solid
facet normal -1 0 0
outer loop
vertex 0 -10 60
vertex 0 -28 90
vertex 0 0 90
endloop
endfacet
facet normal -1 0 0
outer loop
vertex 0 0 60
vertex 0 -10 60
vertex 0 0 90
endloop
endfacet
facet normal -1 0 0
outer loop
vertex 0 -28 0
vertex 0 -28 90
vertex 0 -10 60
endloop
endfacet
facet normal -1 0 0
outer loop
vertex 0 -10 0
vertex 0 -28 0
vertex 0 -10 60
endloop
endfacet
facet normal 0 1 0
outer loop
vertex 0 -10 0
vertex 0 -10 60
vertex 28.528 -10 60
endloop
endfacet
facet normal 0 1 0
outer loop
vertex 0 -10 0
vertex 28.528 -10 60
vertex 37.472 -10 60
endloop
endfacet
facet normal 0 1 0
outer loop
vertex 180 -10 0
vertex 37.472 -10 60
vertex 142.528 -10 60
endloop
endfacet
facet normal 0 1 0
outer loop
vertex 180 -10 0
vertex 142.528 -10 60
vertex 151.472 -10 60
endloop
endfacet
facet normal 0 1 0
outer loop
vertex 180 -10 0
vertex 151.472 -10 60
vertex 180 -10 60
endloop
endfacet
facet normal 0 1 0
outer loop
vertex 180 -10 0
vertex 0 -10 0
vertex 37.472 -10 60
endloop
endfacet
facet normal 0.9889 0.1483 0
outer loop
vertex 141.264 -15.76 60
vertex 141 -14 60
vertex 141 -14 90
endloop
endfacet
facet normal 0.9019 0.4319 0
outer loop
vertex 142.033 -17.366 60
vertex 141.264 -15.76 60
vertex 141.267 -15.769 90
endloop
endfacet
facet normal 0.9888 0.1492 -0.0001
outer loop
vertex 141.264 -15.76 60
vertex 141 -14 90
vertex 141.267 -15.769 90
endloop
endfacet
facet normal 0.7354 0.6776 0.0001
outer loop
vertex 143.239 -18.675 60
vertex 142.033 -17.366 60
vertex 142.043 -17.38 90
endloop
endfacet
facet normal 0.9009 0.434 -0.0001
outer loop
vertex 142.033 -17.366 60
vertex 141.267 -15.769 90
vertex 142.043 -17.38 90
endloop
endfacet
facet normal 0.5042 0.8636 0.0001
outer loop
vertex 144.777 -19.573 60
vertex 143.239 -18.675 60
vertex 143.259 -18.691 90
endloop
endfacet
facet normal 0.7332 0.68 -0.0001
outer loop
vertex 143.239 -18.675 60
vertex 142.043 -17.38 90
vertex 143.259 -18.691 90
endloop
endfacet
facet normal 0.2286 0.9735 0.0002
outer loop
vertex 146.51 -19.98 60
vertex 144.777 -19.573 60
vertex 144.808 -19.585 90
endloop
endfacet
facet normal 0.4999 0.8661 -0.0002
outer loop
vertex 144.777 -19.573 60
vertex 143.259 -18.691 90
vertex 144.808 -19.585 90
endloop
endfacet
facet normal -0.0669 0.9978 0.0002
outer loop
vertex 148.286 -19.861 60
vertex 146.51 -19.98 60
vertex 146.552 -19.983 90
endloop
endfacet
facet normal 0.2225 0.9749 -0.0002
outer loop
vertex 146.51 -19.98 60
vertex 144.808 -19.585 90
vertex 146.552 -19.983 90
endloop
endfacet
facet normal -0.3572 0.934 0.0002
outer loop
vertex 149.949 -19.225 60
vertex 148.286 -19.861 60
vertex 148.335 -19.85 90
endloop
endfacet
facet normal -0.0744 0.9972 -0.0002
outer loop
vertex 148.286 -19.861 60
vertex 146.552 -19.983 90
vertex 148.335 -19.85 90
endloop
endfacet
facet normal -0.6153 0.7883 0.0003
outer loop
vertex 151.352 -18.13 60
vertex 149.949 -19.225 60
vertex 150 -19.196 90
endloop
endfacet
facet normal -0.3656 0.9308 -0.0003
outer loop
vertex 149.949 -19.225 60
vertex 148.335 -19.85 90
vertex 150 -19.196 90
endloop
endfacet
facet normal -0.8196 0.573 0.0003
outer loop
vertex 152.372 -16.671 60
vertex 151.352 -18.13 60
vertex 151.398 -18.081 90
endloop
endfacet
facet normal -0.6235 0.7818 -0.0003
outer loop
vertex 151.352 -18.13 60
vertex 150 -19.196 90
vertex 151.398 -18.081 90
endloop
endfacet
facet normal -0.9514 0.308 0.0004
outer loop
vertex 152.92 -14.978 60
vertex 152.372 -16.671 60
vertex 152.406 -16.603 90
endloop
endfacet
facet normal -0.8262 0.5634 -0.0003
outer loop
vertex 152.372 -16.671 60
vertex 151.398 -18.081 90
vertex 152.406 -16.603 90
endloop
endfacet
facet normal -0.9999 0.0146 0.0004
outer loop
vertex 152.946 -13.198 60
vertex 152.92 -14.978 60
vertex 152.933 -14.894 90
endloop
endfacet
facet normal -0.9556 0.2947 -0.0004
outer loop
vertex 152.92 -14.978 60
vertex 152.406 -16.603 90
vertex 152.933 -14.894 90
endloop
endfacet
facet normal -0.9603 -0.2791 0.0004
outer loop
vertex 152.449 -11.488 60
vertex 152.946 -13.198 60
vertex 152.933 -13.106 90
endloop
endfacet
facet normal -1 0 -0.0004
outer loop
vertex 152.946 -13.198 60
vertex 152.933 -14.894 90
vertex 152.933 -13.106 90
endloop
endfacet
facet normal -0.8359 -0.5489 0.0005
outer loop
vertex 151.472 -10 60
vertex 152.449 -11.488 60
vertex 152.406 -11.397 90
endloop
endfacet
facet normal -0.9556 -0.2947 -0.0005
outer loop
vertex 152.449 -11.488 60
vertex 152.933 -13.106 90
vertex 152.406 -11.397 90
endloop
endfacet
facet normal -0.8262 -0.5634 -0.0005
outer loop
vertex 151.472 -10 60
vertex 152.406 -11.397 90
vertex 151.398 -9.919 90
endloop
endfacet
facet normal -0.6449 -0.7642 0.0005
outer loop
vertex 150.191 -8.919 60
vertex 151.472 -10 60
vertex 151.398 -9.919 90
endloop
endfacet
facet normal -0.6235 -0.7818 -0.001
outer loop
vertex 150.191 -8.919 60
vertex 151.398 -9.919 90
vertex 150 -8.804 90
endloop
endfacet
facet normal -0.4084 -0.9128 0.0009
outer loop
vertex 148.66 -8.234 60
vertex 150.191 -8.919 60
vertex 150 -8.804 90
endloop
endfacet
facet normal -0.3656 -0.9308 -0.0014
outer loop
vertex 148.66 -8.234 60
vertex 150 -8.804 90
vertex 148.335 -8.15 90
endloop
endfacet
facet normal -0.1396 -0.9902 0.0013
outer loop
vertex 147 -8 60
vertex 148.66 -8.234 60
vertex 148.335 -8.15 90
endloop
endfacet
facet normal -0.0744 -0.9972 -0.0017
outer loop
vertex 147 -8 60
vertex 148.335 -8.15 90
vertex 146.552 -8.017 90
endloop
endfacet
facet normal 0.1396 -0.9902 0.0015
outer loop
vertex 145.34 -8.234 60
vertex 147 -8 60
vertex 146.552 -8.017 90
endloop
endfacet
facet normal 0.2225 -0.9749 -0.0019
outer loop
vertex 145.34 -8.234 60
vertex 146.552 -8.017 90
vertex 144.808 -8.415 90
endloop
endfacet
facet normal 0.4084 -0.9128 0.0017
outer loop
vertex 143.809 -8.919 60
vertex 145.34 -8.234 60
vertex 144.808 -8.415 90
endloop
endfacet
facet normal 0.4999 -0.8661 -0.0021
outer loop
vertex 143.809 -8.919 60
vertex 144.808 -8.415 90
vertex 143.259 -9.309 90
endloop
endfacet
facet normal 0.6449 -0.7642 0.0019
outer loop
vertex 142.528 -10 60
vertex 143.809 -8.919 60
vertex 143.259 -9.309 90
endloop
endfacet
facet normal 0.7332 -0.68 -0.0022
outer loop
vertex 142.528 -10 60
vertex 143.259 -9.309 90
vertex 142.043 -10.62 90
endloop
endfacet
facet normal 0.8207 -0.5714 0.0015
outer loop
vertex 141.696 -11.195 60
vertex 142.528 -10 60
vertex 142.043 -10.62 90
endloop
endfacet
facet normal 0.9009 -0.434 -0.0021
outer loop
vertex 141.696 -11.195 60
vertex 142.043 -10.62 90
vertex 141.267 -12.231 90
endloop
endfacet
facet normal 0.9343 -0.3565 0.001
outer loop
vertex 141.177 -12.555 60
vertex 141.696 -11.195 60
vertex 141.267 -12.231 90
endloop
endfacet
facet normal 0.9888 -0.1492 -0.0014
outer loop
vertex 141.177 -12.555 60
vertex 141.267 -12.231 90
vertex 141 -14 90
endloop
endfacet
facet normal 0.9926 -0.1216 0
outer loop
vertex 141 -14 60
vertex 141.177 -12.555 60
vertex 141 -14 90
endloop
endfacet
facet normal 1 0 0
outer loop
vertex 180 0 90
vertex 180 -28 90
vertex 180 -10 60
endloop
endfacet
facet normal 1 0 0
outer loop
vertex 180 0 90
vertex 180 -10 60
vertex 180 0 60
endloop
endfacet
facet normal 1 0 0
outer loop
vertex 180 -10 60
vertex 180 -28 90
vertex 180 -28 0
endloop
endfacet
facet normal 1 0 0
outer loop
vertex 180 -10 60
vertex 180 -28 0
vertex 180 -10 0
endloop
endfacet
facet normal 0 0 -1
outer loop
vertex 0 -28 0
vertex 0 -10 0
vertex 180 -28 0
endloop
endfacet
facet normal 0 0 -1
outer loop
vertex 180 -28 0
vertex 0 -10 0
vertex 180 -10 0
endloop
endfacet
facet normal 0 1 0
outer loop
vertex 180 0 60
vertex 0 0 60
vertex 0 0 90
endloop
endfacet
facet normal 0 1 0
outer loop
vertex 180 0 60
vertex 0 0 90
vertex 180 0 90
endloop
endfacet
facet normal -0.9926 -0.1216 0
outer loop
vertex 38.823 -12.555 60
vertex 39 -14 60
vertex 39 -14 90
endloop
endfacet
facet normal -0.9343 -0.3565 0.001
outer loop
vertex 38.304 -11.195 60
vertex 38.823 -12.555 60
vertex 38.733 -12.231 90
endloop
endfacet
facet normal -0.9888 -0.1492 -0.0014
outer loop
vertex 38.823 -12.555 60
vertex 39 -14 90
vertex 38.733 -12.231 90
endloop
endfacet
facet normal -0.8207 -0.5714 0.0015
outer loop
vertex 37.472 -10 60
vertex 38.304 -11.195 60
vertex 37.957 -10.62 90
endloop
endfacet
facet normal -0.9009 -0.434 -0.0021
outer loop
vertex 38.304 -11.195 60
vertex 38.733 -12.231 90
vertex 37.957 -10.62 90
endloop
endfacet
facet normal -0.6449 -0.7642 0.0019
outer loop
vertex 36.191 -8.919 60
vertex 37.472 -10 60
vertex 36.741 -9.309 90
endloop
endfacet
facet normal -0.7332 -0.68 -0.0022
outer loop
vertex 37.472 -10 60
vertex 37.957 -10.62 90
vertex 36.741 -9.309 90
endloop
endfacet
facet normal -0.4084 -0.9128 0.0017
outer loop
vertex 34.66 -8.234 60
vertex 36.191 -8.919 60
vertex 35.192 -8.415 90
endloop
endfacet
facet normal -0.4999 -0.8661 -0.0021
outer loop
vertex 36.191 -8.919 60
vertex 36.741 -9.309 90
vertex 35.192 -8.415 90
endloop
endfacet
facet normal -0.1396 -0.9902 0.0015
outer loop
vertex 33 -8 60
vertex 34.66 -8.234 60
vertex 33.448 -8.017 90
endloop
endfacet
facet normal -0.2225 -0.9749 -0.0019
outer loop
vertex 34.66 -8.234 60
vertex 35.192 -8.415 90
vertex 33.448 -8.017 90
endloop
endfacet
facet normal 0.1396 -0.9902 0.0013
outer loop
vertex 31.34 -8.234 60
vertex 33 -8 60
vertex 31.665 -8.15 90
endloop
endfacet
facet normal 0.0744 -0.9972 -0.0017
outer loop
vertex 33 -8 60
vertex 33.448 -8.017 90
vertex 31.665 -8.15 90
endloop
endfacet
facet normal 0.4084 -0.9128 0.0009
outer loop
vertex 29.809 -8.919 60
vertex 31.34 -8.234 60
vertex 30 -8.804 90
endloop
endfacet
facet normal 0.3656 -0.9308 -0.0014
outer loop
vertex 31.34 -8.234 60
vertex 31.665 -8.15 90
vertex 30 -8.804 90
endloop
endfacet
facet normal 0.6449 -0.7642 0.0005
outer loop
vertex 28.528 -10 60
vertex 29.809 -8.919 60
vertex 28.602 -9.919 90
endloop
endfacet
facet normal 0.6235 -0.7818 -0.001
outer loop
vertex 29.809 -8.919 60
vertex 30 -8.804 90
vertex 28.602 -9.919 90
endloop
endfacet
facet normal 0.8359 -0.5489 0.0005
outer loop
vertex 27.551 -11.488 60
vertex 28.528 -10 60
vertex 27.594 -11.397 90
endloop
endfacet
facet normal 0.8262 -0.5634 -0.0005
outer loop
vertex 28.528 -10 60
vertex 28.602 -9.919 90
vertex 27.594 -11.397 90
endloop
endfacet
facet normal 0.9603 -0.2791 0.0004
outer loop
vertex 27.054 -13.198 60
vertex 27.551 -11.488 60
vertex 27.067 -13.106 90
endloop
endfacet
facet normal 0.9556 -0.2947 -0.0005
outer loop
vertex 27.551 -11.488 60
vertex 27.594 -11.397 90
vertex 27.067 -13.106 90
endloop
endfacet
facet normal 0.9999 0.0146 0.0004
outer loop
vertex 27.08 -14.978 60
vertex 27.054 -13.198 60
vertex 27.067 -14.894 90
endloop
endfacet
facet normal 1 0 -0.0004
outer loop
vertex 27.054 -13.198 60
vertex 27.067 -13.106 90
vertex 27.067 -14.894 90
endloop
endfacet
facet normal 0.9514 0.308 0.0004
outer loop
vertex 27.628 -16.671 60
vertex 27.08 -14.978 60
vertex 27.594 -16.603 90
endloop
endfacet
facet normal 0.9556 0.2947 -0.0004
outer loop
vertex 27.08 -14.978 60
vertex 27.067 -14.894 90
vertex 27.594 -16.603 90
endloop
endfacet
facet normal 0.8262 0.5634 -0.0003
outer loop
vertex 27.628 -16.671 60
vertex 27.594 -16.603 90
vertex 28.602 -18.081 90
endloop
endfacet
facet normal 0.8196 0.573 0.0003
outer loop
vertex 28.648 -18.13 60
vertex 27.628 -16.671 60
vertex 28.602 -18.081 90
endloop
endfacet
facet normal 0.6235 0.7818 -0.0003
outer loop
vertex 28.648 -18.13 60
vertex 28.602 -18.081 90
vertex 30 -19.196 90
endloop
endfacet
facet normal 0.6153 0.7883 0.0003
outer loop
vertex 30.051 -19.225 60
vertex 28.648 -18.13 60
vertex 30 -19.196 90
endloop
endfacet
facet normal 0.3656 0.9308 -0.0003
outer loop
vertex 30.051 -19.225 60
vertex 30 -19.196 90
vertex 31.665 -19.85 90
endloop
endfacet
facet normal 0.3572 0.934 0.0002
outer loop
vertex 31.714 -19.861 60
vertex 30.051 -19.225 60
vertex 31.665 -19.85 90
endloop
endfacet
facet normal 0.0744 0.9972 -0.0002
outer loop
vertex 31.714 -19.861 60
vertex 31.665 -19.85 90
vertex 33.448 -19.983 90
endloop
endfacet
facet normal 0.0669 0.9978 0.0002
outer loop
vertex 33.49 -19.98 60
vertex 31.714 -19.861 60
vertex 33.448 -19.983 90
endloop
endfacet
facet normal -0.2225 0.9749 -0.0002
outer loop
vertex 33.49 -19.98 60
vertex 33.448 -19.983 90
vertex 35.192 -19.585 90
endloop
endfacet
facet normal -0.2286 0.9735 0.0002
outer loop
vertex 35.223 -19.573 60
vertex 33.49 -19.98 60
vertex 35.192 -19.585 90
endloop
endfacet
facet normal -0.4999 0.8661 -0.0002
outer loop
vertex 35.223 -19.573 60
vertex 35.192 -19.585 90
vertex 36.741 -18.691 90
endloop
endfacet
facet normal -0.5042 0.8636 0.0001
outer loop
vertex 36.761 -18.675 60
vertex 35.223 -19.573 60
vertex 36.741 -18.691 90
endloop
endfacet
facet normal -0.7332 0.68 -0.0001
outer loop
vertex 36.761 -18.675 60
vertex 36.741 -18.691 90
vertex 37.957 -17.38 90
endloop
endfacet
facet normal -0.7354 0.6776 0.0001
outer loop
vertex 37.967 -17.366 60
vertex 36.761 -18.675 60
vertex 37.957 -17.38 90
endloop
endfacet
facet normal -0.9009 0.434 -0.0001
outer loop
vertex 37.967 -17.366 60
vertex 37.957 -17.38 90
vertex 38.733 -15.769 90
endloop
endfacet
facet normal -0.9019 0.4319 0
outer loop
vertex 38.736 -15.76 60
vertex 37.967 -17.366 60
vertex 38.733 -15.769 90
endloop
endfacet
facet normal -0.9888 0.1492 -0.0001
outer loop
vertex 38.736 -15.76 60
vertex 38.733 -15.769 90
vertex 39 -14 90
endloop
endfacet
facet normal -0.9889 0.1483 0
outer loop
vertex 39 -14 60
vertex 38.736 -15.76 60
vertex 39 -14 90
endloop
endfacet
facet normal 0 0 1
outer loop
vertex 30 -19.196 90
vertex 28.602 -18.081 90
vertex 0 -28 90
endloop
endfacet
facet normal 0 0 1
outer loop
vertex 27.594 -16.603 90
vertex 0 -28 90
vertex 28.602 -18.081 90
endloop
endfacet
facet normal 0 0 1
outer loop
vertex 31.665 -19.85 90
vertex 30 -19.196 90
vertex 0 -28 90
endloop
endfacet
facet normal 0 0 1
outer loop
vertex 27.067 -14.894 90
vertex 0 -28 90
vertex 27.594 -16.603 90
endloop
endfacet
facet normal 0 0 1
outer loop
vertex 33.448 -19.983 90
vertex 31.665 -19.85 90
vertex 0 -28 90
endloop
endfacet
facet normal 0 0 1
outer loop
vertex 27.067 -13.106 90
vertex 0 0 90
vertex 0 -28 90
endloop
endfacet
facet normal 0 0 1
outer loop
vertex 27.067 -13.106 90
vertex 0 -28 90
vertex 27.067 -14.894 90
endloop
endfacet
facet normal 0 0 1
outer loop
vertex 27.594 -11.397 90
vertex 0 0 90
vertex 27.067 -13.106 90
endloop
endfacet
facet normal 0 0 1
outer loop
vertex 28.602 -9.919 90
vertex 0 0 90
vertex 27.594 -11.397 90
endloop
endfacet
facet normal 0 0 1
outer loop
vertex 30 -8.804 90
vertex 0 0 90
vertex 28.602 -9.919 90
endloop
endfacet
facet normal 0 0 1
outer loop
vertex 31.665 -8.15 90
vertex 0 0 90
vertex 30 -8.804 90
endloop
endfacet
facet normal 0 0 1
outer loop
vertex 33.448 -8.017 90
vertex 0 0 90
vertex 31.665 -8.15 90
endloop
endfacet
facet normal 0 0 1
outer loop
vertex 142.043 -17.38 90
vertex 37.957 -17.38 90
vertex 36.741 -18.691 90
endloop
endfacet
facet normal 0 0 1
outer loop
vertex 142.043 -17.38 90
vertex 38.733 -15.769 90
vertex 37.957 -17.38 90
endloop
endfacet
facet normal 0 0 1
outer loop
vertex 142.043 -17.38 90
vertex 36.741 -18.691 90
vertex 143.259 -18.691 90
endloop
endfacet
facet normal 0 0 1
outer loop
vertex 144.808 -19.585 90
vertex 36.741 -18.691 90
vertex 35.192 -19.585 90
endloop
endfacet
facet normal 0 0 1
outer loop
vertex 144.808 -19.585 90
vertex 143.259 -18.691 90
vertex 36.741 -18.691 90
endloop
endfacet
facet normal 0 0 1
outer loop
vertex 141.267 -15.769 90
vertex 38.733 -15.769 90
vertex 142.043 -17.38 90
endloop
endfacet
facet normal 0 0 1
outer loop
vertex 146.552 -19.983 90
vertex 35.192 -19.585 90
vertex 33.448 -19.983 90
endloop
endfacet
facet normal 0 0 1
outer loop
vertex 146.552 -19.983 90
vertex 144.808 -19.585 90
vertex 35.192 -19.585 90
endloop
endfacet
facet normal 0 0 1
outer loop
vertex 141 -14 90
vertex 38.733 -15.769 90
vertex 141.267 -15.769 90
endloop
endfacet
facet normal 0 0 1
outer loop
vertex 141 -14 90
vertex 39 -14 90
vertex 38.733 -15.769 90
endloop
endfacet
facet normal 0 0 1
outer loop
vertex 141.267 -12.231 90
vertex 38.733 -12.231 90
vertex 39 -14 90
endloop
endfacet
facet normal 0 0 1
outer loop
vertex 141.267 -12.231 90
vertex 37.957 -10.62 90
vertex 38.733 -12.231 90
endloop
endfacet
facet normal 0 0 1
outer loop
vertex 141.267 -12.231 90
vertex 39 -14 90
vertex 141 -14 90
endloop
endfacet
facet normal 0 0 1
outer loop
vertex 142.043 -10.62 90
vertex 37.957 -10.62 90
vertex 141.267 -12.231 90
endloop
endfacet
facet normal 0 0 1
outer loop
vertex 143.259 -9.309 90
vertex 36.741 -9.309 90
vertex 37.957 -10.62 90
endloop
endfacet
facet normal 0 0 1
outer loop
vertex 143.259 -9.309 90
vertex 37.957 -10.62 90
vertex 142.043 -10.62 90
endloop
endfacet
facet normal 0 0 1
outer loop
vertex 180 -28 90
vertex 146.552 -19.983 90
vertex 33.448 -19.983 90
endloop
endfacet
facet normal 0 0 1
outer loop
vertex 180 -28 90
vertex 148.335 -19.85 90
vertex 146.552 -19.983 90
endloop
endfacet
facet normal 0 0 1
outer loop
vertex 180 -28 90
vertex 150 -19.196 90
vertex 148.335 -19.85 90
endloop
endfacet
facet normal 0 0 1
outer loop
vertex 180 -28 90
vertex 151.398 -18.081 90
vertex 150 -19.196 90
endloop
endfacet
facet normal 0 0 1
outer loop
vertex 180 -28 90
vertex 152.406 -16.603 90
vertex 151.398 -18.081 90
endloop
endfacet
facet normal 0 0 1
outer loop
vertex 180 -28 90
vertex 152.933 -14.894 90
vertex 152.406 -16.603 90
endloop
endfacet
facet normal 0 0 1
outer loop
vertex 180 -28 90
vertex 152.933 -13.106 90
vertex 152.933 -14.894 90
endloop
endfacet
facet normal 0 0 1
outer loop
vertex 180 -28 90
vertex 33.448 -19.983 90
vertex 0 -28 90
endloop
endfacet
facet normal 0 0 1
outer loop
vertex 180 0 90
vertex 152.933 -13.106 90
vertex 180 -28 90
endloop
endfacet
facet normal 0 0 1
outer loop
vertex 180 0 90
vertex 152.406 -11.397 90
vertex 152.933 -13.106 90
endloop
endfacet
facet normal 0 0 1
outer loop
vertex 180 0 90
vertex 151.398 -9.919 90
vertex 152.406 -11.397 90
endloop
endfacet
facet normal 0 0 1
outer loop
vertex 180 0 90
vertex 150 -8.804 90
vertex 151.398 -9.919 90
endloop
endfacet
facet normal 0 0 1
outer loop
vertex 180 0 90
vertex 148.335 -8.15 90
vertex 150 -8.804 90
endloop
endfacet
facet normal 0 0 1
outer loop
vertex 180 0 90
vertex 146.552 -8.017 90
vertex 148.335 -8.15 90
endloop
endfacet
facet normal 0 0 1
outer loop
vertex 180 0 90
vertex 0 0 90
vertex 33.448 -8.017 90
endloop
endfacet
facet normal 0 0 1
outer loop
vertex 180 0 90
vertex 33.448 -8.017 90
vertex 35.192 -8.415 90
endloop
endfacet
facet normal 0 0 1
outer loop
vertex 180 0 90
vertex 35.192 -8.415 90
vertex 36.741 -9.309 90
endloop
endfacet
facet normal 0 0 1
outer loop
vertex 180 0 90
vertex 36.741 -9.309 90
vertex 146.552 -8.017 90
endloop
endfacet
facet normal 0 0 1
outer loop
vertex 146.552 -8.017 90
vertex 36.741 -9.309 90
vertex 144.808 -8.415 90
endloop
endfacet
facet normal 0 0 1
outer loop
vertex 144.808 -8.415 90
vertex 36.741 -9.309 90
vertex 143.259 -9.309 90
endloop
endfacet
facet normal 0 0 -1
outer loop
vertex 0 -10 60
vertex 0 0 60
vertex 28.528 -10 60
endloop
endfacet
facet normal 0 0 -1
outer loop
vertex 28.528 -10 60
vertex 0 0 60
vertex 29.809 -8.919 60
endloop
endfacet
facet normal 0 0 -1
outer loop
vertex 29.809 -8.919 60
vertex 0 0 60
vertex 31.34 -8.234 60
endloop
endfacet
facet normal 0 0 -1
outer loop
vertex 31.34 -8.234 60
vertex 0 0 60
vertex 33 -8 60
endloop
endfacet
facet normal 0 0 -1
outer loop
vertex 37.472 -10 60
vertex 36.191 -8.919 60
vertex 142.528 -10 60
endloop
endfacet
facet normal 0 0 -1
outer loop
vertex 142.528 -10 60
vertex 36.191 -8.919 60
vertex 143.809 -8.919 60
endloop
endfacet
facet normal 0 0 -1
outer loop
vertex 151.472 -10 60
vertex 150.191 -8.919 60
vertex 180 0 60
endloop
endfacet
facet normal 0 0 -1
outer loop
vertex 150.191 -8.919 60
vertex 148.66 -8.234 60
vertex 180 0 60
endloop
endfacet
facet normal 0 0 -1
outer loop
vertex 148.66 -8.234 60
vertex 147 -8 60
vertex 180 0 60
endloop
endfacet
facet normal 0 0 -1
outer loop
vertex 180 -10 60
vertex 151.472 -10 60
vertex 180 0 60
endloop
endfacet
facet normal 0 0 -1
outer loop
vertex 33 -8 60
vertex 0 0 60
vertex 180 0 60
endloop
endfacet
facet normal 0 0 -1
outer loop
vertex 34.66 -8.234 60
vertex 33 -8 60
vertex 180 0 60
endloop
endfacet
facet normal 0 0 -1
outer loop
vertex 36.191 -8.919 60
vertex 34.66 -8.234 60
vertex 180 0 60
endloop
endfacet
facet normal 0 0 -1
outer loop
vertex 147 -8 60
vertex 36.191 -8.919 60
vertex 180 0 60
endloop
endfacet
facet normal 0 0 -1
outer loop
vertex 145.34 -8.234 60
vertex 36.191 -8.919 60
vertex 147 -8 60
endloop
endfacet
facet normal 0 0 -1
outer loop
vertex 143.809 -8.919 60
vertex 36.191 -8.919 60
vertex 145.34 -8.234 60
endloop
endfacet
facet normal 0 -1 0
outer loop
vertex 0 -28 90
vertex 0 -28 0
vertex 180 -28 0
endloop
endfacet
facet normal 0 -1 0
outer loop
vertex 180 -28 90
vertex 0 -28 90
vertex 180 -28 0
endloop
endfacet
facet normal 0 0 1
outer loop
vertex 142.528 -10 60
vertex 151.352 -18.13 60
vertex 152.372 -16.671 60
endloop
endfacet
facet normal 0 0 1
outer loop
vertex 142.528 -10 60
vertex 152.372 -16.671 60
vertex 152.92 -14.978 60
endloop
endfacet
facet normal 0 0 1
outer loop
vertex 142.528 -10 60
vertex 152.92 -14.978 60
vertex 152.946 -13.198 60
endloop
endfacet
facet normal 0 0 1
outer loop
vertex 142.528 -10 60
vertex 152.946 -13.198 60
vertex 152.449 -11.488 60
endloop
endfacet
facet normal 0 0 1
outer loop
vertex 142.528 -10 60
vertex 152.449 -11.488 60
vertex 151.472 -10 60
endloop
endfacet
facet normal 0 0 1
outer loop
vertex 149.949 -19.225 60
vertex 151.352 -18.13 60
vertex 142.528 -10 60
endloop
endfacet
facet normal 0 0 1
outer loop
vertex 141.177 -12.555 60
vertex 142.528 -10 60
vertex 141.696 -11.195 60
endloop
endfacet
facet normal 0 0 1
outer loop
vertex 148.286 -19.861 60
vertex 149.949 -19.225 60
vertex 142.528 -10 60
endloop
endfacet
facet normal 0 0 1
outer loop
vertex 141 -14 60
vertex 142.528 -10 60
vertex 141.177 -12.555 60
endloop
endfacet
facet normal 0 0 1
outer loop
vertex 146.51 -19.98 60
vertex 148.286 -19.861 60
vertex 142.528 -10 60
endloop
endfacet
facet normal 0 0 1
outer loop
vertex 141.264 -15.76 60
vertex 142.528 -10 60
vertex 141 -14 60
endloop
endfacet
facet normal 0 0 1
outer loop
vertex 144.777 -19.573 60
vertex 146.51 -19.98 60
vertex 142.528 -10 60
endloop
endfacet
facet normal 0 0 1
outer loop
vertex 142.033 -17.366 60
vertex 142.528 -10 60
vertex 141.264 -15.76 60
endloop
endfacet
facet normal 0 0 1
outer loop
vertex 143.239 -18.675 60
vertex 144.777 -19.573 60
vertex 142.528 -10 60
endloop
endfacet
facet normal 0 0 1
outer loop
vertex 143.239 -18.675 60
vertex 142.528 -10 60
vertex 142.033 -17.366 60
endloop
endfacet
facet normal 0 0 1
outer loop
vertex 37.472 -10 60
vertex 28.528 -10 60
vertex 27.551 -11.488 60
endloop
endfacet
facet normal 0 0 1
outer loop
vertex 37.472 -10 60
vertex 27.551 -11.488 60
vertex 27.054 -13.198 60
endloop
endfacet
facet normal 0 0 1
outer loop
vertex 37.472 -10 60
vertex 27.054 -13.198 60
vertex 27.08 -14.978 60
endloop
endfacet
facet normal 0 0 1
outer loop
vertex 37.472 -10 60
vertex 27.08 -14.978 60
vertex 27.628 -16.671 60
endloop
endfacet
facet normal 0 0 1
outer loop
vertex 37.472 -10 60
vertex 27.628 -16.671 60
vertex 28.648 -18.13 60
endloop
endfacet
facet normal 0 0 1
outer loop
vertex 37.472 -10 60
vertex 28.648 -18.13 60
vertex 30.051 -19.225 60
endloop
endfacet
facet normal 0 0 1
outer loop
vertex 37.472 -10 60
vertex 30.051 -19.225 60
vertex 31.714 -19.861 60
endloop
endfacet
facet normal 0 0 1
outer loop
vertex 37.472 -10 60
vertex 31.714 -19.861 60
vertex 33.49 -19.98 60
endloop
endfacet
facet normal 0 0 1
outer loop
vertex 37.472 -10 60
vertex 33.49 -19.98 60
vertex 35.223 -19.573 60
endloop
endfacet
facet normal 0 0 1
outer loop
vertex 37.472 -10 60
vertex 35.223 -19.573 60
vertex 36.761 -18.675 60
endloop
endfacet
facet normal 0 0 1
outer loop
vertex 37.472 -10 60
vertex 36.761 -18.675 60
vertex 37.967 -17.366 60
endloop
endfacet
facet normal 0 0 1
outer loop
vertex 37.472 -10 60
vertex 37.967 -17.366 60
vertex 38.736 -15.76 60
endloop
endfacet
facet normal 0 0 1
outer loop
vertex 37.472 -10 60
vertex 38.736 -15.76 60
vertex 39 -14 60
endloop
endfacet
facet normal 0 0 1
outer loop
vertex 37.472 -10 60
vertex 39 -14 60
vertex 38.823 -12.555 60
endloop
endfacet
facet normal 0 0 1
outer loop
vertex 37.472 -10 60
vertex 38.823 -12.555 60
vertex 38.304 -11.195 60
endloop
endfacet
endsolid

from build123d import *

# Parameters (mm, degrees)
SKETCH_1_W          = 180
SKETCH_1_H          = 28
EXTRUDE_1_DEPTH     = 90
SKETCH_2_R          = 6
CUT_EXTRUDE_1_DEPTH = 30
SKETCH_3_W          = 180
SKETCH_3_H          = 60
CUT_EXTRUDE_2_DEPTH = 10


with BuildPart() as part:
    # 草图1 → 拉伸1 (new body)
    with BuildSketch(Plane.XY):
        with Locations((90, -14)):
            Rectangle(SKETCH_1_W, SKETCH_1_H)
    extrude(amount=EXTRUDE_1_DEPTH)

    # 草图2 → 切除-拉伸1 (cut)
    with BuildSketch(Plane.XY.offset(90)):
        with Locations((33, -14)):
            Circle(SKETCH_2_R)
        with Locations(Location((147, -14, 0), (0, 0, 180))):
            Circle(SKETCH_2_R)
    extrude(amount=-CUT_EXTRUDE_1_DEPTH, mode=Mode.SUBTRACT)

    # 草图3 → 切除-拉伸2 (cut)
    with BuildSketch(Plane(origin=(0, 0, 0), x_dir=(1, 0, 0), z_dir=(0, 1, 0))):
        with Locations((90, -30)):
            Rectangle(SKETCH_3_W, SKETCH_3_H)
    extrude(amount=-CUT_EXTRUDE_2_DEPTH, mode=Mode.SUBTRACT)


solid = part.part
